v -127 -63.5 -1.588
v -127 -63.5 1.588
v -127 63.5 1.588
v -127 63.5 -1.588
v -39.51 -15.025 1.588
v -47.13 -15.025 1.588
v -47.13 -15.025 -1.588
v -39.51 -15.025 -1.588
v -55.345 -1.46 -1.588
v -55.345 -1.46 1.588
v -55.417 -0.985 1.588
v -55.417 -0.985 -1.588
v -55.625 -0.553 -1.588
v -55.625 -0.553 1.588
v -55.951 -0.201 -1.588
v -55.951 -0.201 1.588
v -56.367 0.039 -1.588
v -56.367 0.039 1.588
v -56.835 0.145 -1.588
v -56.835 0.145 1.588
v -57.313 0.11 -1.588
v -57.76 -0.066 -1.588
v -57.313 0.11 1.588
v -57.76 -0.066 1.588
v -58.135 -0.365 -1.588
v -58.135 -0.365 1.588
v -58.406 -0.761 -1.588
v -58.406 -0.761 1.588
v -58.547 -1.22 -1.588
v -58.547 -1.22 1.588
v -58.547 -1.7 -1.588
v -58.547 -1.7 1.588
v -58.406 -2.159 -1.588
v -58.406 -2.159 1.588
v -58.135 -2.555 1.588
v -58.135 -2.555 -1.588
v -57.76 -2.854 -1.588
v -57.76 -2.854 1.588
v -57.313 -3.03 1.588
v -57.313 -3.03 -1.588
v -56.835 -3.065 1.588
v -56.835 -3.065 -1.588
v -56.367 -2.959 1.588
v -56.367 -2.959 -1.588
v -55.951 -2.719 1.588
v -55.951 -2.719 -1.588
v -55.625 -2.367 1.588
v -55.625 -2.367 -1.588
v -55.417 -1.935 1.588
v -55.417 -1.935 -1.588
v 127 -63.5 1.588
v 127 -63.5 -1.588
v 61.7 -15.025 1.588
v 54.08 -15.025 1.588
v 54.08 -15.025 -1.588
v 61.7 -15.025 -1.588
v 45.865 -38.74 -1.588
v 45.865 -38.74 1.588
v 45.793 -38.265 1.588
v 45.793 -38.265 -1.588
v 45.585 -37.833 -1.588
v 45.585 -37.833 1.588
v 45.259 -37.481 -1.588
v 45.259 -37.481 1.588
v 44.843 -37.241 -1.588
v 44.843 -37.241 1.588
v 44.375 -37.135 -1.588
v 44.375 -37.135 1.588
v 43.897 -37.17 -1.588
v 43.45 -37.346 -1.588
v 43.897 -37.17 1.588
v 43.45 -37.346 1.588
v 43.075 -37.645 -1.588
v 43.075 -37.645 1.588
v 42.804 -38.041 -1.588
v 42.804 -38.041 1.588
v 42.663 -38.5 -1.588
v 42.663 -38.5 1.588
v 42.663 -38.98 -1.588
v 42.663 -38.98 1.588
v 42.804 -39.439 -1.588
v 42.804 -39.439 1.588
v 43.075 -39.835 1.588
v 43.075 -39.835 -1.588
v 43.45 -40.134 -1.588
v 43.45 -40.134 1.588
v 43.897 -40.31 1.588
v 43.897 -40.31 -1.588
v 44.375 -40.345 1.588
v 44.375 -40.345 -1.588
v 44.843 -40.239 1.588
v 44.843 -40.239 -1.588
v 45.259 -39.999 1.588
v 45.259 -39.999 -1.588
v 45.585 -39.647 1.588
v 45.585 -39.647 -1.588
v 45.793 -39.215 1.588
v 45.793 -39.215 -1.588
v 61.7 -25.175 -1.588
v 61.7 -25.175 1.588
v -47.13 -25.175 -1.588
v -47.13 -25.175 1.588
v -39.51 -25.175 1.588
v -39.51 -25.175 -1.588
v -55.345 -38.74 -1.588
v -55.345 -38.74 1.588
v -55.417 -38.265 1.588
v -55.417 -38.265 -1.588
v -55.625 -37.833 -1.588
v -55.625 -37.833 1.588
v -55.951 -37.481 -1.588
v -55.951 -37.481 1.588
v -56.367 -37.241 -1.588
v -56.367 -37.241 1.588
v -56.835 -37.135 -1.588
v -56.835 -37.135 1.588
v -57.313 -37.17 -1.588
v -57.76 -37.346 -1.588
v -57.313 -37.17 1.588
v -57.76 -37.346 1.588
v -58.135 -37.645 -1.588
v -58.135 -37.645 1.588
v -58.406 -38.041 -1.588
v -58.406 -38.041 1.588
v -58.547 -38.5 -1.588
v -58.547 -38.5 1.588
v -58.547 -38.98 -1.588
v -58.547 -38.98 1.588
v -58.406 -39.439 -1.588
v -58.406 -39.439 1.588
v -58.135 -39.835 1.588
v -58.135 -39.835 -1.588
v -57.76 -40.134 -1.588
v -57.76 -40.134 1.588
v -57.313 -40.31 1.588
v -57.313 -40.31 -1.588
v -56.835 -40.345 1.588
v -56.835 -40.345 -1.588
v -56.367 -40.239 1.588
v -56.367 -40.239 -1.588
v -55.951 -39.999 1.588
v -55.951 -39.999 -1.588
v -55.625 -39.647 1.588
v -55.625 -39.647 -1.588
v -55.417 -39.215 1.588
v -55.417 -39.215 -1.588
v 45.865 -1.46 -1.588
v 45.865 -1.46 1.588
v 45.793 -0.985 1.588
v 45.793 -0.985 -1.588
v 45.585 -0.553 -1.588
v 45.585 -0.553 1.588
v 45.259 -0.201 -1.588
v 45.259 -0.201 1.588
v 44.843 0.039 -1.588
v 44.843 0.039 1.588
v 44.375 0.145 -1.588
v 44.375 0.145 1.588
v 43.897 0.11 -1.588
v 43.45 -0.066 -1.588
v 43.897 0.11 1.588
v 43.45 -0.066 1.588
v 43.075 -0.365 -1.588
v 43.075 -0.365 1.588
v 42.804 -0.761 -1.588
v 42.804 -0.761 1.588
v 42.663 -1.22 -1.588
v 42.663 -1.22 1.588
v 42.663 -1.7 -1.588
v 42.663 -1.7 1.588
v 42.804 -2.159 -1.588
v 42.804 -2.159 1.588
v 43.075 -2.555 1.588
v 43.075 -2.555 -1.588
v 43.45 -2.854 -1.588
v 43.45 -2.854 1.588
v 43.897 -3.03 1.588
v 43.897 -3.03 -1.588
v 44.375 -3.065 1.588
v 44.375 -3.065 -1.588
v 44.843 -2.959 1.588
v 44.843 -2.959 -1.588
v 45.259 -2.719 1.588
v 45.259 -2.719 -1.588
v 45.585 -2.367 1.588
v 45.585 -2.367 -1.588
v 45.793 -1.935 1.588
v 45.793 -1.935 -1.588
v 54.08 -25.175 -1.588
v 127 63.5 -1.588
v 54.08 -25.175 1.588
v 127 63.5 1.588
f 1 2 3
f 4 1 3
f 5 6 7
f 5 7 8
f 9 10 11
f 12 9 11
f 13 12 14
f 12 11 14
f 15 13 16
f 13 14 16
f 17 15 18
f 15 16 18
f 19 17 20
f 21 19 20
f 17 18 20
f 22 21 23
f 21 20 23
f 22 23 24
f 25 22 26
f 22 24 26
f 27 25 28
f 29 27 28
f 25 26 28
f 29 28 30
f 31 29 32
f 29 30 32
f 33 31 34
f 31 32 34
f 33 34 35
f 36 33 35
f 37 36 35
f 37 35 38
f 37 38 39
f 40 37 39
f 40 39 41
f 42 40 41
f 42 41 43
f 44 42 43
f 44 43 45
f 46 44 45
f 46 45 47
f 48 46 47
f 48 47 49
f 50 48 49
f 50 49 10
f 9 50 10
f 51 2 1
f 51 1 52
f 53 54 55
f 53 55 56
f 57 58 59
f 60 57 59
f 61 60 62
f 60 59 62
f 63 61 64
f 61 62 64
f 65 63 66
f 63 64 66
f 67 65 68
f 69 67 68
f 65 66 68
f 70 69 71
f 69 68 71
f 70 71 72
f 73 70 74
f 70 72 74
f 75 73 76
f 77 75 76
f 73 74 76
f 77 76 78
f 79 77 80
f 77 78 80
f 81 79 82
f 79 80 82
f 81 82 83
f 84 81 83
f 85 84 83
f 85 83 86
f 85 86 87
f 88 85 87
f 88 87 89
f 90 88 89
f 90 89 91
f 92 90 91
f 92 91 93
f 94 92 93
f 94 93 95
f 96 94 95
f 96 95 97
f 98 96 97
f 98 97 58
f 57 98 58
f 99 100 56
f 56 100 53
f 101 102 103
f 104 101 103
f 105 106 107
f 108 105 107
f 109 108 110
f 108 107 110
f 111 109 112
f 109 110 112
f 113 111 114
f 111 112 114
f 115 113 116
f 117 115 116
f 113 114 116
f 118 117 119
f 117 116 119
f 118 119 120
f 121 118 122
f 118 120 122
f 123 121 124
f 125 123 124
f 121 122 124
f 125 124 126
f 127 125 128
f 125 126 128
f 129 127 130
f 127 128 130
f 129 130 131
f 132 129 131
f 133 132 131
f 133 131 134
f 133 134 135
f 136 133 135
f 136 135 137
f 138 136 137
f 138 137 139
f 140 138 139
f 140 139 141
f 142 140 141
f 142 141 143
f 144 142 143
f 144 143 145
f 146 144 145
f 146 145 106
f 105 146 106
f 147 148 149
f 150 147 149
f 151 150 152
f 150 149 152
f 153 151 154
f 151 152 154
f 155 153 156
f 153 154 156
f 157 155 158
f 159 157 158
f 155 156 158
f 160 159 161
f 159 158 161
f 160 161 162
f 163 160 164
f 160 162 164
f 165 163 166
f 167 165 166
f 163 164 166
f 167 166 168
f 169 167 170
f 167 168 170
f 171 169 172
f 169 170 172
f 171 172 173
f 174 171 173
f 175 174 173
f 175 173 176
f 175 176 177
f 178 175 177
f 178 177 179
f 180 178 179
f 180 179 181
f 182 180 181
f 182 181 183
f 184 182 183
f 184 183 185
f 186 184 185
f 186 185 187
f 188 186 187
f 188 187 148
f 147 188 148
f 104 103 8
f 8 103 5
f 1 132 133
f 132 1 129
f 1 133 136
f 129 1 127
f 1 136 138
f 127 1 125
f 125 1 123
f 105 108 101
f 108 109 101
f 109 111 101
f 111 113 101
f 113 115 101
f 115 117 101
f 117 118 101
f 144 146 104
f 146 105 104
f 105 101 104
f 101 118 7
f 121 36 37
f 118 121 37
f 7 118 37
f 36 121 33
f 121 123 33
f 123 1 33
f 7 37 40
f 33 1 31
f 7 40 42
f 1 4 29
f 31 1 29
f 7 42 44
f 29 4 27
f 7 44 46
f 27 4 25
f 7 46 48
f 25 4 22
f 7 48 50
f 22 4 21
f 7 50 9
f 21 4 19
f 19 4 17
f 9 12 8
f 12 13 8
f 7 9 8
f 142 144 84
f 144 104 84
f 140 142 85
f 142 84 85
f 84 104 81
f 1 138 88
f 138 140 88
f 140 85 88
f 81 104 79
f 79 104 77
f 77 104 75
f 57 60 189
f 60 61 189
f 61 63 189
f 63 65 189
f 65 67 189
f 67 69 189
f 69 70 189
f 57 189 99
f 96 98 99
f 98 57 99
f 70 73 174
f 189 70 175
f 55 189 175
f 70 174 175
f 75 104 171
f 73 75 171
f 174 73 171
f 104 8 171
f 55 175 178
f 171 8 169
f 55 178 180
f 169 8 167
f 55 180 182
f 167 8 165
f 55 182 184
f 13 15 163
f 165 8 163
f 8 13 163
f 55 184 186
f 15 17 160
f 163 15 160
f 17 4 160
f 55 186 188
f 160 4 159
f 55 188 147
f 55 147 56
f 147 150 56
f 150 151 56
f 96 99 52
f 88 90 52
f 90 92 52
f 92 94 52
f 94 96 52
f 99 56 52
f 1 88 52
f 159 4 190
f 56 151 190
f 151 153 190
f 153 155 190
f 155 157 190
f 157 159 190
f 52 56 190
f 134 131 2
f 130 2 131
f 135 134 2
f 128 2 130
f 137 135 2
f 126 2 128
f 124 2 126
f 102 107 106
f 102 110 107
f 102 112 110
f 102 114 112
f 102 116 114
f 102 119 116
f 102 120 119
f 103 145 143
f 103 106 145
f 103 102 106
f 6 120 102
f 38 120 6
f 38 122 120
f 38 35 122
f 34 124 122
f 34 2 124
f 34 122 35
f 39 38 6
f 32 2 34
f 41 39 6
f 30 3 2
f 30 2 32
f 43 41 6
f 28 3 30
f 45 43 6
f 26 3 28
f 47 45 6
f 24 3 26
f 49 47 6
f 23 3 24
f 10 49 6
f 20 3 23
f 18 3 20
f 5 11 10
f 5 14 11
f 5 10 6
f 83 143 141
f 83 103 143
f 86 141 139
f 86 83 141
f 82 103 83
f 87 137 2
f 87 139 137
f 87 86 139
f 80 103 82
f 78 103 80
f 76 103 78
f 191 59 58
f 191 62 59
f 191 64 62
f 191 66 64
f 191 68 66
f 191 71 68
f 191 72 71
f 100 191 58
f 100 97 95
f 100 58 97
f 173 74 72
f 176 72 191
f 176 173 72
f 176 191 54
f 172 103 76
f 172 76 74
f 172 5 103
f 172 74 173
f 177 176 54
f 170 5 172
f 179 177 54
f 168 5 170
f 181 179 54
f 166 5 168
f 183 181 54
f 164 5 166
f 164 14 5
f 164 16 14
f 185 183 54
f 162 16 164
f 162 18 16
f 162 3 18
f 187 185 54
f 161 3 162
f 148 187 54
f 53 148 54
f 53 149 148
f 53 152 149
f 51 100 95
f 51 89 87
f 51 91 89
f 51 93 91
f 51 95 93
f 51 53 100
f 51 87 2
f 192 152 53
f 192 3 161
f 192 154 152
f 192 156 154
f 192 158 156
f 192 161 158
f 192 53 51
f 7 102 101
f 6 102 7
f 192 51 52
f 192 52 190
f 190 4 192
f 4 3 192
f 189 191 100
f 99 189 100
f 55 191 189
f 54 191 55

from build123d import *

# Parameters (mm, degrees)
SKETCH1_W           = 254
SKETCH1_H           = 127
BOSS_EXTRUDE1_DEPTH = 1.5875
SKETCH2_R           = 1.61
SKETCH2_W           = 7.62
SKETCH2_H           = 10.15
CUT_EXTRUDE1_DEPTH  = 5.08


with BuildPart() as part:
    # Sketch1 → Boss-Extrude1 (new body, symmetric)
    with BuildSketch(Plane.XY):
        Rectangle(SKETCH1_W, SKETCH1_H)
    extrude(amount=BOSS_EXTRUDE1_DEPTH, both=True)

    # Sketch2 → Cut-Extrude1 (cut)
    with BuildSketch(Plane.XY.offset(1.5875)):
        with Locations((-56.955000009, -1.46)):
            Circle(SKETCH2_R)
        with Locations((-56.955000009, -38.74)):
            Circle(SKETCH2_R)
        with Locations((44.25500001, -38.74)):
            Circle(SKETCH2_R)
        with Locations((44.25500001, -1.46)):
            Circle(SKETCH2_R)
        with Locations((-43.320000018, -20.1)):
            Rectangle(SKETCH2_W, SKETCH2_H)
        with Locations((57.890000001, -20.1)):
            Rectangle(SKETCH2_W, SKETCH2_H)
    extrude(amount=-CUT_EXTRUDE1_DEPTH, mode=Mode.SUBTRACT)


solid = part.part
